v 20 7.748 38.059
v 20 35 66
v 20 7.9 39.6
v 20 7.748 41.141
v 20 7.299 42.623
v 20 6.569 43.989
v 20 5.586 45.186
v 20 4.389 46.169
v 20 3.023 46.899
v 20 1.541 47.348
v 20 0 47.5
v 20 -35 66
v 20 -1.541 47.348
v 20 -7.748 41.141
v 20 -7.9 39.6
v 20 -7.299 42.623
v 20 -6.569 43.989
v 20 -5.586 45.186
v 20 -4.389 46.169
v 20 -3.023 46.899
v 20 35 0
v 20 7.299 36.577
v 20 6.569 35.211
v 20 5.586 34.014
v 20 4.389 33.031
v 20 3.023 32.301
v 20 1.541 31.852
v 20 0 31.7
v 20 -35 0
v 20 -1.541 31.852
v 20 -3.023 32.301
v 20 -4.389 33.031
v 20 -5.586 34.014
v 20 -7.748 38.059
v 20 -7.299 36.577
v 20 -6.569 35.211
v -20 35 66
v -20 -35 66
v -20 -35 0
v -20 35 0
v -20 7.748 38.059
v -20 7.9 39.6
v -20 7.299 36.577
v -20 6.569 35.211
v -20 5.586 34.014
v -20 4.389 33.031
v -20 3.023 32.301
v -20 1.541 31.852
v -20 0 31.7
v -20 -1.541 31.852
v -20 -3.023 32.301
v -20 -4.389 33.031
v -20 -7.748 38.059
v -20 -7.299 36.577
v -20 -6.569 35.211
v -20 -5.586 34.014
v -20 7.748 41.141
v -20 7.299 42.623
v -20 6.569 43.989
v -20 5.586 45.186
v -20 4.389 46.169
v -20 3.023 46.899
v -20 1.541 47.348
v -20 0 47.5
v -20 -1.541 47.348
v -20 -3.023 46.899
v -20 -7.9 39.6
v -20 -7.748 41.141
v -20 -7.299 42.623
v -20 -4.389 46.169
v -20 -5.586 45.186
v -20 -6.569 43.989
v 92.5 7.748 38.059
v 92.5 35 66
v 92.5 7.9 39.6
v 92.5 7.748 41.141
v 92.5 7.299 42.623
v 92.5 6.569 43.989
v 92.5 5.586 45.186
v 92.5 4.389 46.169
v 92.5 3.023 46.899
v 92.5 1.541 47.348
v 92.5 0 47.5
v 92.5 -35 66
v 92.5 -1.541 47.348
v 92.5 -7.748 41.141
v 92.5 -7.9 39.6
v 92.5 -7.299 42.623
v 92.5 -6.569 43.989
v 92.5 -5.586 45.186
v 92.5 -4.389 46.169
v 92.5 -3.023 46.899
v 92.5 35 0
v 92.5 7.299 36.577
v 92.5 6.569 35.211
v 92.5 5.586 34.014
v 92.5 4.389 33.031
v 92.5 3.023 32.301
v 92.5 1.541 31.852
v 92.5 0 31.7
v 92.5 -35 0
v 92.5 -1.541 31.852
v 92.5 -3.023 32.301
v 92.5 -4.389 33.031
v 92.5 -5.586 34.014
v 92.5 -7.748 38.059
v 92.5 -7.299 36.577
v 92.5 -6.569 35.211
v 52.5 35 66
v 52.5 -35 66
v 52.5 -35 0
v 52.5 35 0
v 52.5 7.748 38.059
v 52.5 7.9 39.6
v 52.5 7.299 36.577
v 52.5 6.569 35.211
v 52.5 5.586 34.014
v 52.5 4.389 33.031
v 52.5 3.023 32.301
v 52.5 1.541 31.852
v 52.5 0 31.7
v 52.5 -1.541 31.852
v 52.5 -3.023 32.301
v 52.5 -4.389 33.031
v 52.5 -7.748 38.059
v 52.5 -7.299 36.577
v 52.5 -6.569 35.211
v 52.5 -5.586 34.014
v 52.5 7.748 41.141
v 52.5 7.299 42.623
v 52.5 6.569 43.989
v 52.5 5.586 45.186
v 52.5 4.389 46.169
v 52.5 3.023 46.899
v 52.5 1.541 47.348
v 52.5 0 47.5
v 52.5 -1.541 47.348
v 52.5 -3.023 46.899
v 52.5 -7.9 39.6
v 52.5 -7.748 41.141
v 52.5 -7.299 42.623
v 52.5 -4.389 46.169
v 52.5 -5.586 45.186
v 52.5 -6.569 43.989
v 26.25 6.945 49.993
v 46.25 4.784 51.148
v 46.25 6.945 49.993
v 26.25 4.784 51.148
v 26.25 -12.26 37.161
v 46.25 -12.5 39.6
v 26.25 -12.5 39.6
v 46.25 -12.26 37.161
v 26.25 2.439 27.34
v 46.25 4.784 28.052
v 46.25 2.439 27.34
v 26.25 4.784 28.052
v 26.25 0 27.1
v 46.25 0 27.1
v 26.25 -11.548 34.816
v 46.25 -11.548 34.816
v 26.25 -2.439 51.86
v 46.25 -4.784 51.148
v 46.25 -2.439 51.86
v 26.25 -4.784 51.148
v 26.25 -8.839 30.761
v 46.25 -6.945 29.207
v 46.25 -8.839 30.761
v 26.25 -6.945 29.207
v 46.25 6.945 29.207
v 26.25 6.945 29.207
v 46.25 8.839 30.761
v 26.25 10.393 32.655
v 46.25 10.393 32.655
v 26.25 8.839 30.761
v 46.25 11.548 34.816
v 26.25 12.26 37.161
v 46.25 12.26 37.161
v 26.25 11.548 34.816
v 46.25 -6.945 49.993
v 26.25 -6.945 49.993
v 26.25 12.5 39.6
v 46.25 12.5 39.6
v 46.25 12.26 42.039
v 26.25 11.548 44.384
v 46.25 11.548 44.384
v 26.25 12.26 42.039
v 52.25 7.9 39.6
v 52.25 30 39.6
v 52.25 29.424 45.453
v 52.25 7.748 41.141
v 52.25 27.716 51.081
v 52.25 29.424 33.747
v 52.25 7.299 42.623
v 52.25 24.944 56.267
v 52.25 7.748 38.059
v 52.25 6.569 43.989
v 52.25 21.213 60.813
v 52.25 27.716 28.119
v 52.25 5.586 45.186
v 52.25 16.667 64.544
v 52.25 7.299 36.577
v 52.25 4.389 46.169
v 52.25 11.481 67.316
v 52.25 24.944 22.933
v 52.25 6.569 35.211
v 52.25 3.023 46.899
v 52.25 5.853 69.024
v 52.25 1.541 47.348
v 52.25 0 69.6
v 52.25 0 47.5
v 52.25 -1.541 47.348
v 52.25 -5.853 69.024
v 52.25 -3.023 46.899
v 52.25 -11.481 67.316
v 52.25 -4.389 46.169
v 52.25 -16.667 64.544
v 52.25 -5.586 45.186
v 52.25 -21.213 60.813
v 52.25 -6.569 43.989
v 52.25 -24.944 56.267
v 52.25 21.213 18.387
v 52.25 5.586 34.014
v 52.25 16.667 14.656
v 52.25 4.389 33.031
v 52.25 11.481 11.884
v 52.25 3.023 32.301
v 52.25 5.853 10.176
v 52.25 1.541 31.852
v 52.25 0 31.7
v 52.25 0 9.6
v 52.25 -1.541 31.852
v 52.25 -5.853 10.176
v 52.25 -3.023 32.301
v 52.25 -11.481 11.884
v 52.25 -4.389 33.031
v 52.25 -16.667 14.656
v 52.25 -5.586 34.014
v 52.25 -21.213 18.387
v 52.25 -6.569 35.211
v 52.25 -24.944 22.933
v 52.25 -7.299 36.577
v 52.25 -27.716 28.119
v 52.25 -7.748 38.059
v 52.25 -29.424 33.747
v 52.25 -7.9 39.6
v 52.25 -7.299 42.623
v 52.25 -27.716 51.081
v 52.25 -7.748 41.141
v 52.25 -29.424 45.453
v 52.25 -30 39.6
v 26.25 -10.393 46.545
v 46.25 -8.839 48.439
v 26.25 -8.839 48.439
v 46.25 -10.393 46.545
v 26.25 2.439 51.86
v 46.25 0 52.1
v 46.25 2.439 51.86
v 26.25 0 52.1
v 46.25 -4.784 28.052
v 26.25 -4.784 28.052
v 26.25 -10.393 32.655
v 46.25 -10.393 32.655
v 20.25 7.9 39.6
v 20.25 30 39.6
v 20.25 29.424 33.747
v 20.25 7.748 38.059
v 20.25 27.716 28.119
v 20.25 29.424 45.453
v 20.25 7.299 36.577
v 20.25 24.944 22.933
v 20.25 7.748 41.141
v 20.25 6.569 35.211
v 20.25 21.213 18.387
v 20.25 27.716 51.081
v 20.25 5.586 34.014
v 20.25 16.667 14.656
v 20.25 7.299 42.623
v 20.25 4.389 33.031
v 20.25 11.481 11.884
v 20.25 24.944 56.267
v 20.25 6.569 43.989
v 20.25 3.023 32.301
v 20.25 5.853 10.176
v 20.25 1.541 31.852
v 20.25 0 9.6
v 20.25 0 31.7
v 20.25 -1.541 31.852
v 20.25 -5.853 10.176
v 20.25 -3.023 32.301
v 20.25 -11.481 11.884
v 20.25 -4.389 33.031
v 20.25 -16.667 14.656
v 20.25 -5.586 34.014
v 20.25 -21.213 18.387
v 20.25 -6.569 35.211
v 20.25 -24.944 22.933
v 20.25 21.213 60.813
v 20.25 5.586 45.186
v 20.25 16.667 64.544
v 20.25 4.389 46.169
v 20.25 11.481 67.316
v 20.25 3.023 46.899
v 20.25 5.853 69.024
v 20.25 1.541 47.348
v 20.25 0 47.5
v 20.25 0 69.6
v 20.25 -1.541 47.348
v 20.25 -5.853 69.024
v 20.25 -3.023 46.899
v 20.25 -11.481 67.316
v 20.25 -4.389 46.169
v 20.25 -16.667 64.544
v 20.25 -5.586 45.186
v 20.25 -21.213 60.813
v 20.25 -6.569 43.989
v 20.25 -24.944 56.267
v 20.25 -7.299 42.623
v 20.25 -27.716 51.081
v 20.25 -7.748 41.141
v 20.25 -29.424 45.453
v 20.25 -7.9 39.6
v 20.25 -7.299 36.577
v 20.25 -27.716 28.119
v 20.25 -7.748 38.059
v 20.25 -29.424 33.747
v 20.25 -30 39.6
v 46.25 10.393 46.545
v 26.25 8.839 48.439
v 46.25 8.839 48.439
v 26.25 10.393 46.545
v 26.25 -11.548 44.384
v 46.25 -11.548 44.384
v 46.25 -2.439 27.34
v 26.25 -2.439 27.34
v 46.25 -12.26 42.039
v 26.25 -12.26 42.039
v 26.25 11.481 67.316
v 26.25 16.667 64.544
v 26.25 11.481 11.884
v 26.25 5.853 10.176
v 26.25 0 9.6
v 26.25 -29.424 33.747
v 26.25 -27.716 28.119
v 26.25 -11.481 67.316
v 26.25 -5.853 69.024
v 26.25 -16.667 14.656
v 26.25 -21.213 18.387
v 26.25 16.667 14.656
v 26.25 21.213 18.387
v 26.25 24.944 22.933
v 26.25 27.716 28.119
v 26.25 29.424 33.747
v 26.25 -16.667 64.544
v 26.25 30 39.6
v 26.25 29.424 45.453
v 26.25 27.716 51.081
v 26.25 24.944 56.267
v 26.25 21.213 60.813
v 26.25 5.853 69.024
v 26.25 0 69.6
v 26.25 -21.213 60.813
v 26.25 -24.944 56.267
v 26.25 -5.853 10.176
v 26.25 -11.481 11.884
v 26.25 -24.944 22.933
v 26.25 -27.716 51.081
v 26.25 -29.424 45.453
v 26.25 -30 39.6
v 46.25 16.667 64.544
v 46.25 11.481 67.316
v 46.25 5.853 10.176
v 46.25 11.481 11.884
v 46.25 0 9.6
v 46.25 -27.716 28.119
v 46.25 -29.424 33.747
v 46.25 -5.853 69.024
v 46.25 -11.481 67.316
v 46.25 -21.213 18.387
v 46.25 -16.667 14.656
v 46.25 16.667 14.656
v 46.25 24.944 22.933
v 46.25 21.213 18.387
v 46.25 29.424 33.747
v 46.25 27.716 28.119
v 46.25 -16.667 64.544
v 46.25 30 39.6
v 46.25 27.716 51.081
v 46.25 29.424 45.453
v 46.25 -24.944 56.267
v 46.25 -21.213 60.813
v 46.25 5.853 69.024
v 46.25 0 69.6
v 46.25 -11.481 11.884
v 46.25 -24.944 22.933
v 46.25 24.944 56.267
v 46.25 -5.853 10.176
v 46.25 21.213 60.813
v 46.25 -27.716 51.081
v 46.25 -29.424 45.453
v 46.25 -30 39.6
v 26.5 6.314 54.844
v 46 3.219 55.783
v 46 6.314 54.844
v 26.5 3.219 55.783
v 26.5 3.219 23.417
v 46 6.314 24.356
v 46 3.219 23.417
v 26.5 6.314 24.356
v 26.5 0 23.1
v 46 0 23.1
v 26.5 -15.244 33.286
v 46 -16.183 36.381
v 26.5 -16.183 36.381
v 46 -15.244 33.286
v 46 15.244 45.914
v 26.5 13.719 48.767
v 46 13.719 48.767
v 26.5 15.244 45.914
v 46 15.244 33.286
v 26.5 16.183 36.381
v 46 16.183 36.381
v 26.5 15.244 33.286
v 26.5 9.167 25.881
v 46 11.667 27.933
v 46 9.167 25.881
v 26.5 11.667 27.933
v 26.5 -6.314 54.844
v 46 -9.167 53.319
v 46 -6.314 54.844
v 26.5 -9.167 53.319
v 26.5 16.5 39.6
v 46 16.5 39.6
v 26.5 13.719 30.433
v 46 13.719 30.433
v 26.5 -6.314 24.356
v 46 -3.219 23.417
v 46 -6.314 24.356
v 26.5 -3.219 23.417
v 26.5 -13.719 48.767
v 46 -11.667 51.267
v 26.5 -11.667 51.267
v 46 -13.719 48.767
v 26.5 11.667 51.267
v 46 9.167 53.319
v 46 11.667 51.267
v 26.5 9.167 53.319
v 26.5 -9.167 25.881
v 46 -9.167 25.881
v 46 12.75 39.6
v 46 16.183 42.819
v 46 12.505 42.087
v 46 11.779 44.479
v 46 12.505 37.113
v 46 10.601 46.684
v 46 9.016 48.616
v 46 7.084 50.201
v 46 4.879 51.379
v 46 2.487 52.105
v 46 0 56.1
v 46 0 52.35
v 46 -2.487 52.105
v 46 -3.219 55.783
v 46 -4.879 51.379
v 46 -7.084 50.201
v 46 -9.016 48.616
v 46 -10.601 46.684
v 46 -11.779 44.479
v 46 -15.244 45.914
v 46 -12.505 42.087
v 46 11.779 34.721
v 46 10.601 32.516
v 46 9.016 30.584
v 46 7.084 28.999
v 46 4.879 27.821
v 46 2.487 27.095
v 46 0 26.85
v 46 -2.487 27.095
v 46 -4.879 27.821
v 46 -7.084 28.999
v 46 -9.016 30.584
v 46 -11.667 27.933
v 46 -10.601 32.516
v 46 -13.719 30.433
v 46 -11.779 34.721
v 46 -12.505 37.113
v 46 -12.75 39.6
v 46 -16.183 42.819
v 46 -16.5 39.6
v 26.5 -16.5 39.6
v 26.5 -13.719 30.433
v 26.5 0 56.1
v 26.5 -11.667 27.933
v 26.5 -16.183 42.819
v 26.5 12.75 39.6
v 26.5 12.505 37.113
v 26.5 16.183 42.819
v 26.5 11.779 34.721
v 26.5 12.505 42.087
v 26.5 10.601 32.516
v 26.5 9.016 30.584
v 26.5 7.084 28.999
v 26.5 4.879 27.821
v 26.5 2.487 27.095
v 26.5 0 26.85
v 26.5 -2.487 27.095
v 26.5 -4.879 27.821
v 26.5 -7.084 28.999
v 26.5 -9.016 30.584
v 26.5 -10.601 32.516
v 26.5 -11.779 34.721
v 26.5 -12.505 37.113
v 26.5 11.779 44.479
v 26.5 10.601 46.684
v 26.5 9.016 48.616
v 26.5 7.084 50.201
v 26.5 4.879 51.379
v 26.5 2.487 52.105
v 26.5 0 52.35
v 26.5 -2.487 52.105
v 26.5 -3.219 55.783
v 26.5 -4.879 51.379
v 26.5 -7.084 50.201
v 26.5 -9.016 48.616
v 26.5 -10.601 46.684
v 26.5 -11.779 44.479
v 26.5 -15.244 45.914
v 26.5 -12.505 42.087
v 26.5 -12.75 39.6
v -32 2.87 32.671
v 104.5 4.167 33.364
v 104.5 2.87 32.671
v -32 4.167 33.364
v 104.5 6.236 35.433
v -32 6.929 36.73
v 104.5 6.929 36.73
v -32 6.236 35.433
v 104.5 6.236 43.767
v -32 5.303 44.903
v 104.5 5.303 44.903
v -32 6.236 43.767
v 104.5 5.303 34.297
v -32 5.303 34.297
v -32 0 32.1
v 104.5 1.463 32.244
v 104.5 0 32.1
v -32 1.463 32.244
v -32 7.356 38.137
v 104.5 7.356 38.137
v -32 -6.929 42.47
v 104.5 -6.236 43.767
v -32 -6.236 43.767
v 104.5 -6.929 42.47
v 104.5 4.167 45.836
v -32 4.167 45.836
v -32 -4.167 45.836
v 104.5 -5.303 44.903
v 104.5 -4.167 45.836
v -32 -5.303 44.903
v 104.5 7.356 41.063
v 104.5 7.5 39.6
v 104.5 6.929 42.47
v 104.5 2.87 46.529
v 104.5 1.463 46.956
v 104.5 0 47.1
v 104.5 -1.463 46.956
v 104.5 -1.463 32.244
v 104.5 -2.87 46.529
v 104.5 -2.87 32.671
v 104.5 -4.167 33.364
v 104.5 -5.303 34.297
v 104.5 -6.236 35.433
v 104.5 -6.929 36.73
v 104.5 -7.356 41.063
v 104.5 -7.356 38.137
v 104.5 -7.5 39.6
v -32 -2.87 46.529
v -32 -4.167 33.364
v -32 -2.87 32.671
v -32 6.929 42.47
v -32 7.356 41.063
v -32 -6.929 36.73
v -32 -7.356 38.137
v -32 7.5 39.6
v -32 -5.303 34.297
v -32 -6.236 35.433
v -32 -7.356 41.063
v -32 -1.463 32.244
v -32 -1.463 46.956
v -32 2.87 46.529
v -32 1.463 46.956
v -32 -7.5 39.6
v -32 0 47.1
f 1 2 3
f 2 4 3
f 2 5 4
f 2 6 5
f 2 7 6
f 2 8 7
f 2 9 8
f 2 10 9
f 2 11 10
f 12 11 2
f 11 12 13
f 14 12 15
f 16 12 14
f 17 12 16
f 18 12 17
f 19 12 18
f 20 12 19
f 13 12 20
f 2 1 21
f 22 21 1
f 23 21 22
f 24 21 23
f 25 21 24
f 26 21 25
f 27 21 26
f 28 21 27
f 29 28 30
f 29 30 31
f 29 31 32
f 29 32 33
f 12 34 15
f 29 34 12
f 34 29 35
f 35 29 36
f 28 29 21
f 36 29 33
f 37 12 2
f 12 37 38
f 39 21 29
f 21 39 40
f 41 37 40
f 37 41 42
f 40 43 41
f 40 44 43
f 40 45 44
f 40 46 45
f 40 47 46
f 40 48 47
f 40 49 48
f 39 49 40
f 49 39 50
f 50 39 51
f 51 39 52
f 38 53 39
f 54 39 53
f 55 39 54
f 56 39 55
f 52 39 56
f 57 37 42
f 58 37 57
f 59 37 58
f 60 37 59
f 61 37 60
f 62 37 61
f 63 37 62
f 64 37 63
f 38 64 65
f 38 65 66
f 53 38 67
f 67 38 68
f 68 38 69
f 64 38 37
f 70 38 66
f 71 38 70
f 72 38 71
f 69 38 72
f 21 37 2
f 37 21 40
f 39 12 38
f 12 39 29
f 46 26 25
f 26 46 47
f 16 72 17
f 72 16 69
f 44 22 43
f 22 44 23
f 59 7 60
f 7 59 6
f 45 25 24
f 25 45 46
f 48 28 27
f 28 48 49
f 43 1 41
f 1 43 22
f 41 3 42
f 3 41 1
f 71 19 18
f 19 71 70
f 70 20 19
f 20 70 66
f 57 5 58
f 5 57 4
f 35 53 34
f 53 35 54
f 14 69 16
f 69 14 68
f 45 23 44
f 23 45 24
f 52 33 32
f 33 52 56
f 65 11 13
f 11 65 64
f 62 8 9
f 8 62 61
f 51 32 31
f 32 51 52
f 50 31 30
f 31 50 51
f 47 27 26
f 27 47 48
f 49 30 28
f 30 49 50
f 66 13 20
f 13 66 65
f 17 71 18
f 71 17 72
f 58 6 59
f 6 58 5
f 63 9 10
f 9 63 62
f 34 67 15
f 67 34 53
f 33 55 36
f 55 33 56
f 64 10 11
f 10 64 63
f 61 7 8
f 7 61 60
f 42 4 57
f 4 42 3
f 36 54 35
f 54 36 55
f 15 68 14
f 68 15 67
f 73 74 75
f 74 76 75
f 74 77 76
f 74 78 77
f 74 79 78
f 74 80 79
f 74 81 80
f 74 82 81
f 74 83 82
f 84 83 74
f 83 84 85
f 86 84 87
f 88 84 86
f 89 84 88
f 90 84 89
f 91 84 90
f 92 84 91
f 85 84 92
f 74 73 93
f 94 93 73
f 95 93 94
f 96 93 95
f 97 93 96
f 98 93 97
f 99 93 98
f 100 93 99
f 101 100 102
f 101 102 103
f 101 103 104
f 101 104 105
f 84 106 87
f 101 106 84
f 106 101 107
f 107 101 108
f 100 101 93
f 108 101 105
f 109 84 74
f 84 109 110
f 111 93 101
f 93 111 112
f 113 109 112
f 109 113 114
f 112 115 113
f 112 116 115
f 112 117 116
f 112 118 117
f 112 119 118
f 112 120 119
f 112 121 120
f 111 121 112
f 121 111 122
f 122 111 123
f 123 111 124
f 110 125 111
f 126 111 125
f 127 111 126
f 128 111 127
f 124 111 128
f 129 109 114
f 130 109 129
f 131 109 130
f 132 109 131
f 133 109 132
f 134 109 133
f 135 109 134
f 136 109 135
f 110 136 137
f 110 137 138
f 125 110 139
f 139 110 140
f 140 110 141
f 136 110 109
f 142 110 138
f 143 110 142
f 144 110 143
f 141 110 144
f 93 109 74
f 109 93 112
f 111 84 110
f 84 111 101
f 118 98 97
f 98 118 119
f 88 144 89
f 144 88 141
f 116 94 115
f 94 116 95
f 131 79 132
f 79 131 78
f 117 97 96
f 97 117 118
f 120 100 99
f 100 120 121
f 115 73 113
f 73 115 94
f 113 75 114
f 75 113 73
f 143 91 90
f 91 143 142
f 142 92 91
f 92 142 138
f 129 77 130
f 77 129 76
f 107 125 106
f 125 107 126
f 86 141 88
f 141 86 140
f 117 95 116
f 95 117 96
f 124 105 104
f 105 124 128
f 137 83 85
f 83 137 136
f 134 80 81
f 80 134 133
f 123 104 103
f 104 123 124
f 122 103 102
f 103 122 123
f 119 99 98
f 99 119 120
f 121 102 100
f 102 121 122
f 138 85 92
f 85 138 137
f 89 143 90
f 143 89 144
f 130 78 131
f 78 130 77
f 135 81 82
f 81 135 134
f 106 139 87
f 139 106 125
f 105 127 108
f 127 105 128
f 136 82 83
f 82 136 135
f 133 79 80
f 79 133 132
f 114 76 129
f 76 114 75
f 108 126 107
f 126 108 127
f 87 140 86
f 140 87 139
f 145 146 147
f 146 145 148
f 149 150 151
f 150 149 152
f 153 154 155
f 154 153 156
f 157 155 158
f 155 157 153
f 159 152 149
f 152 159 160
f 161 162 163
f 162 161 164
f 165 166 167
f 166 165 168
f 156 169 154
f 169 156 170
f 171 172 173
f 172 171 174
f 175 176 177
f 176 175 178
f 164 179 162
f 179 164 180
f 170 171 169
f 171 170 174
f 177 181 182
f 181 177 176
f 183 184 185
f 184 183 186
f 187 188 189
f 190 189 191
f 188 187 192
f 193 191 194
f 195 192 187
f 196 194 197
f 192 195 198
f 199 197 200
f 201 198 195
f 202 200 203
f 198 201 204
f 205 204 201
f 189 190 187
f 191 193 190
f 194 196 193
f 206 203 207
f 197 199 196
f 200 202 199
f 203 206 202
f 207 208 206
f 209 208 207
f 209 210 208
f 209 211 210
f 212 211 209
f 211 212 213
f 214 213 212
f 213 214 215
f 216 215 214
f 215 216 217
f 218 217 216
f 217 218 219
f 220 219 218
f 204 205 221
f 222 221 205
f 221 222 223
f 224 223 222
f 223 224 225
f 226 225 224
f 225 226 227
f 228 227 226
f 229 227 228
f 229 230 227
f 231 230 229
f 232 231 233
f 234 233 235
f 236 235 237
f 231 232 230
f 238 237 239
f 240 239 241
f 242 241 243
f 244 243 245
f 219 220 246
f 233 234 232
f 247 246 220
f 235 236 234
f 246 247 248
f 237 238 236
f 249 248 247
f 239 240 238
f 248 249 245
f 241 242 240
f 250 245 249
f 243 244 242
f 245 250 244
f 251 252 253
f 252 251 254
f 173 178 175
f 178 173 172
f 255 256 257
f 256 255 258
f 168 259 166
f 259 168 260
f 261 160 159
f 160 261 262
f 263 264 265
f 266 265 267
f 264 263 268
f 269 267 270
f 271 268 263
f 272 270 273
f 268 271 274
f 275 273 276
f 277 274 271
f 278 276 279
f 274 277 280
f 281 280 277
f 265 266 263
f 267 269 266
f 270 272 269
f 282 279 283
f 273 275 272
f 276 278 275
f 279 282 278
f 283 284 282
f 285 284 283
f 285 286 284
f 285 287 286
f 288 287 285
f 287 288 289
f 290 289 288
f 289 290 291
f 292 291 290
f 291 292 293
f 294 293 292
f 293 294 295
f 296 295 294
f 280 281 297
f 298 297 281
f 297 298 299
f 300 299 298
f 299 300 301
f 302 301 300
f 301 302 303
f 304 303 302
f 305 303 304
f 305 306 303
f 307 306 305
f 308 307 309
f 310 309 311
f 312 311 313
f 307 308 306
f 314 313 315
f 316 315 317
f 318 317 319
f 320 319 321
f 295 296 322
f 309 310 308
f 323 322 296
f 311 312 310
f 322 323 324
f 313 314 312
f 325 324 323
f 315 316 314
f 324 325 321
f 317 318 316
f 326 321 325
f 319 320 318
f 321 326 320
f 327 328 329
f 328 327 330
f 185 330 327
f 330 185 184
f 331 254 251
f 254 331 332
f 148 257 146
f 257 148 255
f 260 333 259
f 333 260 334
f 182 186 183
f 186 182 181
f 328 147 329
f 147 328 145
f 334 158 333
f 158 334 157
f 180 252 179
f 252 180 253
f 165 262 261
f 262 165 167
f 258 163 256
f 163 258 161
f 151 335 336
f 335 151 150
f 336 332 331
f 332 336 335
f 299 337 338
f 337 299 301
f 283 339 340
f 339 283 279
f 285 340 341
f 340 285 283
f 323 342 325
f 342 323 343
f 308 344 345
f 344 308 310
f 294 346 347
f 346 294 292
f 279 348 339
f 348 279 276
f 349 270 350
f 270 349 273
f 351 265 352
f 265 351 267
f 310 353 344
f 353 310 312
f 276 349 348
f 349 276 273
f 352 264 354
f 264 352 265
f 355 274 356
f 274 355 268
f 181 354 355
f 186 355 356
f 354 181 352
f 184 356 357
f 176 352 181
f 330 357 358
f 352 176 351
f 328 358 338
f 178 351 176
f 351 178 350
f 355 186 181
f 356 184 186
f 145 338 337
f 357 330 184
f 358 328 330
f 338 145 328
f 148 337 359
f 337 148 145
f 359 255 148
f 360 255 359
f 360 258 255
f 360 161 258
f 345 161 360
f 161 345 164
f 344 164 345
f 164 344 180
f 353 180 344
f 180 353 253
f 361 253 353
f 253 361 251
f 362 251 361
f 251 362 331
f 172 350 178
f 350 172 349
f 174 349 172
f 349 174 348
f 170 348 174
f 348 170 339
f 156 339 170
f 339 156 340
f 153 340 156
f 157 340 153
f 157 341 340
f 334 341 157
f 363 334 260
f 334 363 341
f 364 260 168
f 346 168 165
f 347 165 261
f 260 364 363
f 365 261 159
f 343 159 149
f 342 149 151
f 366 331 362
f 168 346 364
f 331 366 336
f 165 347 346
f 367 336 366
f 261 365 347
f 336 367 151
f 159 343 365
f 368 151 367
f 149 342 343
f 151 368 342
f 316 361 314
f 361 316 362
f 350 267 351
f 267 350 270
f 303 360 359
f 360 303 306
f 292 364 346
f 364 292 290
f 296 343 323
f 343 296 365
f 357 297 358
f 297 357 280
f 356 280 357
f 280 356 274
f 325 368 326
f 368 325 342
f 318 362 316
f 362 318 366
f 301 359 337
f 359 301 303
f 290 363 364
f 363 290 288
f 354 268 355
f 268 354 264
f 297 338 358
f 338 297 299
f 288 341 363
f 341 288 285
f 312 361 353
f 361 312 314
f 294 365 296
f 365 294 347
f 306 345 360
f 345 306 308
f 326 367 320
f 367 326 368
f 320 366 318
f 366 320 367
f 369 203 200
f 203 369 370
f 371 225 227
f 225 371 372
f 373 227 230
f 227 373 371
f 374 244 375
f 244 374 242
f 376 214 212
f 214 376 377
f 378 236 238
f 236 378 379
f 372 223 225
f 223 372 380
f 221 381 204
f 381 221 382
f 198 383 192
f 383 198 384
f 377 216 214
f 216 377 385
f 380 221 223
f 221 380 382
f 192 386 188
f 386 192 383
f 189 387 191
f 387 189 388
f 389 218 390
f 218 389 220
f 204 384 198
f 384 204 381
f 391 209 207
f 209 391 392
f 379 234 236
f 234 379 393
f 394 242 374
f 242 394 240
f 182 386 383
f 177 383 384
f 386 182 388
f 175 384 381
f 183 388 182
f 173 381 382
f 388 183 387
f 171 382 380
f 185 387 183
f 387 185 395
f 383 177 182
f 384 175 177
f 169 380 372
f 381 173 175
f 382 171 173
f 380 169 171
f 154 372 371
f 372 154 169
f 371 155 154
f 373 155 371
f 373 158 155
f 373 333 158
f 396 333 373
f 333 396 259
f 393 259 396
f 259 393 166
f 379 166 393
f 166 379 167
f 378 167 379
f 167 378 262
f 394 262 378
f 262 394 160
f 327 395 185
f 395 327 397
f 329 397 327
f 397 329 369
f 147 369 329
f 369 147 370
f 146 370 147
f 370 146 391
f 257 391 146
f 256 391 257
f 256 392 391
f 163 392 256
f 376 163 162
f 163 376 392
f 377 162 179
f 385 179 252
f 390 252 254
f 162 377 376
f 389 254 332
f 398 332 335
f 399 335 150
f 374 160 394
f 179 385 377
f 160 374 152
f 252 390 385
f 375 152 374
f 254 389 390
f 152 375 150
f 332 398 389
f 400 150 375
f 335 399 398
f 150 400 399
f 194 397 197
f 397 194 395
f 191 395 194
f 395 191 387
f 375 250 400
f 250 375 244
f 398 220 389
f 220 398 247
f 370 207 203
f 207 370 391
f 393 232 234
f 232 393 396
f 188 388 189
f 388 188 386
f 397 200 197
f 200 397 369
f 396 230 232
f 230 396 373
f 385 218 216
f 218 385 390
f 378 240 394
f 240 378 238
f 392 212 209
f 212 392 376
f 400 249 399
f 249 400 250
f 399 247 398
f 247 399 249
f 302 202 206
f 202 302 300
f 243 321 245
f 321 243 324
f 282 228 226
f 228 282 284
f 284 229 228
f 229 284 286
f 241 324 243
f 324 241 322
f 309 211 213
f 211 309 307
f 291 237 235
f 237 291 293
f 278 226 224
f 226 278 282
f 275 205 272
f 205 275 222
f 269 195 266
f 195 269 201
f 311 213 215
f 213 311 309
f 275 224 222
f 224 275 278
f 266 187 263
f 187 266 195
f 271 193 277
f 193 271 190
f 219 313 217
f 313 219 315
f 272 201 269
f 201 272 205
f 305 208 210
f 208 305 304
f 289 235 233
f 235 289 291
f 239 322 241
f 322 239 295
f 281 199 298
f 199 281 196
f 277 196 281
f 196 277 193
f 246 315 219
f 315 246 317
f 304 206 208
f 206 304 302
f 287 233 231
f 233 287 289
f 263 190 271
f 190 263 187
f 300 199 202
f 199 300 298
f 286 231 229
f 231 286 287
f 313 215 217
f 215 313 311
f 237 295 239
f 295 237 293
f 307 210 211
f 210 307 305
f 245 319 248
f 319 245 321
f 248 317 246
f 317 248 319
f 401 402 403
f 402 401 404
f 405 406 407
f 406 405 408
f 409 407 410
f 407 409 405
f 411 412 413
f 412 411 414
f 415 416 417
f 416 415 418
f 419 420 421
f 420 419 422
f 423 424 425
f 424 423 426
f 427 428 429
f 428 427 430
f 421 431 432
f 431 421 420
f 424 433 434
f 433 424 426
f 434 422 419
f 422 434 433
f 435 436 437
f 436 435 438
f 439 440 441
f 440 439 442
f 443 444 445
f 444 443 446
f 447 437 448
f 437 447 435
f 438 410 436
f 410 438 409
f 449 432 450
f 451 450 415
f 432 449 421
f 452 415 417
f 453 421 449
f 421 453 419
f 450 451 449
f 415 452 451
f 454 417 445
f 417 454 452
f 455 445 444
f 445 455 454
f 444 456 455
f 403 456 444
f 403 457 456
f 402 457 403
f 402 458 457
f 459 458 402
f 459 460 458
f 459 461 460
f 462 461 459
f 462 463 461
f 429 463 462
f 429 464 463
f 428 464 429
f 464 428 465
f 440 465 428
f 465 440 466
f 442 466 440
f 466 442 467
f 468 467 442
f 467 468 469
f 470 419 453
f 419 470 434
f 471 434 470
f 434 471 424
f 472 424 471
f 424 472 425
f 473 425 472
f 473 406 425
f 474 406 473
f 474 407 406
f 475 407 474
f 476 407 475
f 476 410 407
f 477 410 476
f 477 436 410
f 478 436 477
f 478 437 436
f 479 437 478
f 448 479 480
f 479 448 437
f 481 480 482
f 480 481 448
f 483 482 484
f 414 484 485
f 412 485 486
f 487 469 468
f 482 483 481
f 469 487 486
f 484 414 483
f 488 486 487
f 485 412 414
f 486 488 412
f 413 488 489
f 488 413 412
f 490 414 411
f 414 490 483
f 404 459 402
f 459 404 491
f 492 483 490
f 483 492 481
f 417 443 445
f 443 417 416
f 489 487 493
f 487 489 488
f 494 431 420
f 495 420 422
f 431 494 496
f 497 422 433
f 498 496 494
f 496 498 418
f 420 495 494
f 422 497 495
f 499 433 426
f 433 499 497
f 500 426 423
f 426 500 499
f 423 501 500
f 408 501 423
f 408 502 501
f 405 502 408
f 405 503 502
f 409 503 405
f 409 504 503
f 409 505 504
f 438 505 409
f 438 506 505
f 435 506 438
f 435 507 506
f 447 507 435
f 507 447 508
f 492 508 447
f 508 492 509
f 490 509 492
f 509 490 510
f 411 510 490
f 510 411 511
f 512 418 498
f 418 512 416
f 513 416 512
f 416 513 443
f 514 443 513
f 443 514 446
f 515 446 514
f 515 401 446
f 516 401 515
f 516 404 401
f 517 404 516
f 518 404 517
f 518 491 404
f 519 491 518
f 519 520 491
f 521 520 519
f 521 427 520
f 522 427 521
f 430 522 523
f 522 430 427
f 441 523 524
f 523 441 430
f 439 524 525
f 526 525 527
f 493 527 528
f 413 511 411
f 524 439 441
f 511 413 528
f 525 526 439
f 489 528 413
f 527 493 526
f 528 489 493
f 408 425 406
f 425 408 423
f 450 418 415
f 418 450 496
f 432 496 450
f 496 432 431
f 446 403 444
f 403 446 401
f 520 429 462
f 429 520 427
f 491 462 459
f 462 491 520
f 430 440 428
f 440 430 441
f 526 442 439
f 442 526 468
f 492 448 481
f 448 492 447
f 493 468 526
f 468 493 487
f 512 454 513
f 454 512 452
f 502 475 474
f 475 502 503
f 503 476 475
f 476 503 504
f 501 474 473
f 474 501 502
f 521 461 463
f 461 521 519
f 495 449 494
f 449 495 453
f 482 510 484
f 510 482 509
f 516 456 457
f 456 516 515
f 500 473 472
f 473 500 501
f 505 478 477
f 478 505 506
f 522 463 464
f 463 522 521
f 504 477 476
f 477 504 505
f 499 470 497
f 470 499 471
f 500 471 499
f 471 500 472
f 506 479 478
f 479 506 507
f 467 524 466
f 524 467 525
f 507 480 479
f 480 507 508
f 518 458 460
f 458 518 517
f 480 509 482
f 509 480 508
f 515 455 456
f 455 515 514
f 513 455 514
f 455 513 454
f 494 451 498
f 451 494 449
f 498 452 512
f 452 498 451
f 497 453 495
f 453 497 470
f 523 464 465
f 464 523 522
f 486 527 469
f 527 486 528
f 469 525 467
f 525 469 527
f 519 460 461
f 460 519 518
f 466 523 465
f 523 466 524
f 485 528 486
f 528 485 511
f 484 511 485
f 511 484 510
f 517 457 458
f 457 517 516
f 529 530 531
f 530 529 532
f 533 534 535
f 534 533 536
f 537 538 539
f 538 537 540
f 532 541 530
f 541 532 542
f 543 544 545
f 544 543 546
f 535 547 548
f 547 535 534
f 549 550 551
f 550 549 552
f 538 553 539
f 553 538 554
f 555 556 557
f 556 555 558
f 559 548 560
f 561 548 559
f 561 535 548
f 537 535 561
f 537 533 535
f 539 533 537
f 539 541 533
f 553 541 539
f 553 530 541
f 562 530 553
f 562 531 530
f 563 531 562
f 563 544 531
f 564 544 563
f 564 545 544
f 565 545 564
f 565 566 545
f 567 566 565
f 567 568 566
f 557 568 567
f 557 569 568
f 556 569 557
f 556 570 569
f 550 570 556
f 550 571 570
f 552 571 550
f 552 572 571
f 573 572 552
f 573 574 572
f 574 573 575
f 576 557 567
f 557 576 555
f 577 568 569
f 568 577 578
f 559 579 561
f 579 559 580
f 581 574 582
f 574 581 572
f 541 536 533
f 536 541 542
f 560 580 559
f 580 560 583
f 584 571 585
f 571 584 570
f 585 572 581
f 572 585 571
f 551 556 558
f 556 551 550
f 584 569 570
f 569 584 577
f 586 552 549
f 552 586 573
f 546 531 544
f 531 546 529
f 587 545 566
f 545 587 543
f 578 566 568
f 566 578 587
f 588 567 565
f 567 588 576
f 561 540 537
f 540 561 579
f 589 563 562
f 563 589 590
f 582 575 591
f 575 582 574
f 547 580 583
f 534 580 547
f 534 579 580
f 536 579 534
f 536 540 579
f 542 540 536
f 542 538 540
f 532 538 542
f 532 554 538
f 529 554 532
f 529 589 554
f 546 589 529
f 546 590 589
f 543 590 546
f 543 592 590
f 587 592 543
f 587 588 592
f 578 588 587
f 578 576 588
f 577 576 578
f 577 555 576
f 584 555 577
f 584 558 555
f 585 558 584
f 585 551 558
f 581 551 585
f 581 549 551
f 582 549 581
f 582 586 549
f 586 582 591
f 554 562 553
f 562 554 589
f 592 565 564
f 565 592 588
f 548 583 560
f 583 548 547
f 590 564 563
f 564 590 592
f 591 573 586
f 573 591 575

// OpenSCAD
$fn = 32;

// ------------------------------------------------------------------------
// Pulley assembly: d60 pulley with a belt, shaft d15
// Every part is its own module, assembly() places them once.
// ------------------------------------------------------------------------

// --- part 1 ---
module support1() {
  difference() {
    translate([-20, -35, 0]) cube([40, 70, 66]);
    translate([0, 0, 39.6]) rotate([0, 90, 0]) cylinder(h = 42, d = 15.8, center = true);
  }
}

// --- part 2 ---
module support2() {
  difference() {
    translate([-20, -35, 0]) cube([40, 70, 66]);
    translate([0, 0, 39.6]) rotate([0, 90, 0]) cylinder(h = 42, d = 15.8, center = true);
  }
}

// --- part 3 ---
module shaft() {
  translate([0, 0, -68.25]) cylinder(h = 136.5, d = 15);
}

// --- part 4 ---
module pulley() {
  difference() {
    union() {
      cylinder(h = 32, d = 25);
      cylinder(h = 6, d = 60);
      translate([0, 0, 26]) cylinder(h = 6, d = 60);
    }
    translate([0, 0, -1]) cylinder(h = 34, d = 15.8);
  }
}

// --- part 5 ---
module belt() {
  difference() {
      translate([0, 0, 0]) cylinder(h = 19.5, d = 33);
      translate([0, 0, -1]) cylinder(h = 21.5, d = 25.5);
    }
}

// --- assembly ---
module assembly() {
  translate([0, 0, 0]) rotate([0, 0, 0]) support1();
  translate([72.5, 0, 0]) rotate([0, 0, 0]) support2();
  translate([36.25, 0, 39.6]) rotate([0, 90, 0]) shaft();
  translate([20.25, 0, 39.6]) rotate([0, 90, 0]) pulley();
  translate([26.5, 0, 39.6]) rotate([0, 90, 0]) belt();
}

assembly();
